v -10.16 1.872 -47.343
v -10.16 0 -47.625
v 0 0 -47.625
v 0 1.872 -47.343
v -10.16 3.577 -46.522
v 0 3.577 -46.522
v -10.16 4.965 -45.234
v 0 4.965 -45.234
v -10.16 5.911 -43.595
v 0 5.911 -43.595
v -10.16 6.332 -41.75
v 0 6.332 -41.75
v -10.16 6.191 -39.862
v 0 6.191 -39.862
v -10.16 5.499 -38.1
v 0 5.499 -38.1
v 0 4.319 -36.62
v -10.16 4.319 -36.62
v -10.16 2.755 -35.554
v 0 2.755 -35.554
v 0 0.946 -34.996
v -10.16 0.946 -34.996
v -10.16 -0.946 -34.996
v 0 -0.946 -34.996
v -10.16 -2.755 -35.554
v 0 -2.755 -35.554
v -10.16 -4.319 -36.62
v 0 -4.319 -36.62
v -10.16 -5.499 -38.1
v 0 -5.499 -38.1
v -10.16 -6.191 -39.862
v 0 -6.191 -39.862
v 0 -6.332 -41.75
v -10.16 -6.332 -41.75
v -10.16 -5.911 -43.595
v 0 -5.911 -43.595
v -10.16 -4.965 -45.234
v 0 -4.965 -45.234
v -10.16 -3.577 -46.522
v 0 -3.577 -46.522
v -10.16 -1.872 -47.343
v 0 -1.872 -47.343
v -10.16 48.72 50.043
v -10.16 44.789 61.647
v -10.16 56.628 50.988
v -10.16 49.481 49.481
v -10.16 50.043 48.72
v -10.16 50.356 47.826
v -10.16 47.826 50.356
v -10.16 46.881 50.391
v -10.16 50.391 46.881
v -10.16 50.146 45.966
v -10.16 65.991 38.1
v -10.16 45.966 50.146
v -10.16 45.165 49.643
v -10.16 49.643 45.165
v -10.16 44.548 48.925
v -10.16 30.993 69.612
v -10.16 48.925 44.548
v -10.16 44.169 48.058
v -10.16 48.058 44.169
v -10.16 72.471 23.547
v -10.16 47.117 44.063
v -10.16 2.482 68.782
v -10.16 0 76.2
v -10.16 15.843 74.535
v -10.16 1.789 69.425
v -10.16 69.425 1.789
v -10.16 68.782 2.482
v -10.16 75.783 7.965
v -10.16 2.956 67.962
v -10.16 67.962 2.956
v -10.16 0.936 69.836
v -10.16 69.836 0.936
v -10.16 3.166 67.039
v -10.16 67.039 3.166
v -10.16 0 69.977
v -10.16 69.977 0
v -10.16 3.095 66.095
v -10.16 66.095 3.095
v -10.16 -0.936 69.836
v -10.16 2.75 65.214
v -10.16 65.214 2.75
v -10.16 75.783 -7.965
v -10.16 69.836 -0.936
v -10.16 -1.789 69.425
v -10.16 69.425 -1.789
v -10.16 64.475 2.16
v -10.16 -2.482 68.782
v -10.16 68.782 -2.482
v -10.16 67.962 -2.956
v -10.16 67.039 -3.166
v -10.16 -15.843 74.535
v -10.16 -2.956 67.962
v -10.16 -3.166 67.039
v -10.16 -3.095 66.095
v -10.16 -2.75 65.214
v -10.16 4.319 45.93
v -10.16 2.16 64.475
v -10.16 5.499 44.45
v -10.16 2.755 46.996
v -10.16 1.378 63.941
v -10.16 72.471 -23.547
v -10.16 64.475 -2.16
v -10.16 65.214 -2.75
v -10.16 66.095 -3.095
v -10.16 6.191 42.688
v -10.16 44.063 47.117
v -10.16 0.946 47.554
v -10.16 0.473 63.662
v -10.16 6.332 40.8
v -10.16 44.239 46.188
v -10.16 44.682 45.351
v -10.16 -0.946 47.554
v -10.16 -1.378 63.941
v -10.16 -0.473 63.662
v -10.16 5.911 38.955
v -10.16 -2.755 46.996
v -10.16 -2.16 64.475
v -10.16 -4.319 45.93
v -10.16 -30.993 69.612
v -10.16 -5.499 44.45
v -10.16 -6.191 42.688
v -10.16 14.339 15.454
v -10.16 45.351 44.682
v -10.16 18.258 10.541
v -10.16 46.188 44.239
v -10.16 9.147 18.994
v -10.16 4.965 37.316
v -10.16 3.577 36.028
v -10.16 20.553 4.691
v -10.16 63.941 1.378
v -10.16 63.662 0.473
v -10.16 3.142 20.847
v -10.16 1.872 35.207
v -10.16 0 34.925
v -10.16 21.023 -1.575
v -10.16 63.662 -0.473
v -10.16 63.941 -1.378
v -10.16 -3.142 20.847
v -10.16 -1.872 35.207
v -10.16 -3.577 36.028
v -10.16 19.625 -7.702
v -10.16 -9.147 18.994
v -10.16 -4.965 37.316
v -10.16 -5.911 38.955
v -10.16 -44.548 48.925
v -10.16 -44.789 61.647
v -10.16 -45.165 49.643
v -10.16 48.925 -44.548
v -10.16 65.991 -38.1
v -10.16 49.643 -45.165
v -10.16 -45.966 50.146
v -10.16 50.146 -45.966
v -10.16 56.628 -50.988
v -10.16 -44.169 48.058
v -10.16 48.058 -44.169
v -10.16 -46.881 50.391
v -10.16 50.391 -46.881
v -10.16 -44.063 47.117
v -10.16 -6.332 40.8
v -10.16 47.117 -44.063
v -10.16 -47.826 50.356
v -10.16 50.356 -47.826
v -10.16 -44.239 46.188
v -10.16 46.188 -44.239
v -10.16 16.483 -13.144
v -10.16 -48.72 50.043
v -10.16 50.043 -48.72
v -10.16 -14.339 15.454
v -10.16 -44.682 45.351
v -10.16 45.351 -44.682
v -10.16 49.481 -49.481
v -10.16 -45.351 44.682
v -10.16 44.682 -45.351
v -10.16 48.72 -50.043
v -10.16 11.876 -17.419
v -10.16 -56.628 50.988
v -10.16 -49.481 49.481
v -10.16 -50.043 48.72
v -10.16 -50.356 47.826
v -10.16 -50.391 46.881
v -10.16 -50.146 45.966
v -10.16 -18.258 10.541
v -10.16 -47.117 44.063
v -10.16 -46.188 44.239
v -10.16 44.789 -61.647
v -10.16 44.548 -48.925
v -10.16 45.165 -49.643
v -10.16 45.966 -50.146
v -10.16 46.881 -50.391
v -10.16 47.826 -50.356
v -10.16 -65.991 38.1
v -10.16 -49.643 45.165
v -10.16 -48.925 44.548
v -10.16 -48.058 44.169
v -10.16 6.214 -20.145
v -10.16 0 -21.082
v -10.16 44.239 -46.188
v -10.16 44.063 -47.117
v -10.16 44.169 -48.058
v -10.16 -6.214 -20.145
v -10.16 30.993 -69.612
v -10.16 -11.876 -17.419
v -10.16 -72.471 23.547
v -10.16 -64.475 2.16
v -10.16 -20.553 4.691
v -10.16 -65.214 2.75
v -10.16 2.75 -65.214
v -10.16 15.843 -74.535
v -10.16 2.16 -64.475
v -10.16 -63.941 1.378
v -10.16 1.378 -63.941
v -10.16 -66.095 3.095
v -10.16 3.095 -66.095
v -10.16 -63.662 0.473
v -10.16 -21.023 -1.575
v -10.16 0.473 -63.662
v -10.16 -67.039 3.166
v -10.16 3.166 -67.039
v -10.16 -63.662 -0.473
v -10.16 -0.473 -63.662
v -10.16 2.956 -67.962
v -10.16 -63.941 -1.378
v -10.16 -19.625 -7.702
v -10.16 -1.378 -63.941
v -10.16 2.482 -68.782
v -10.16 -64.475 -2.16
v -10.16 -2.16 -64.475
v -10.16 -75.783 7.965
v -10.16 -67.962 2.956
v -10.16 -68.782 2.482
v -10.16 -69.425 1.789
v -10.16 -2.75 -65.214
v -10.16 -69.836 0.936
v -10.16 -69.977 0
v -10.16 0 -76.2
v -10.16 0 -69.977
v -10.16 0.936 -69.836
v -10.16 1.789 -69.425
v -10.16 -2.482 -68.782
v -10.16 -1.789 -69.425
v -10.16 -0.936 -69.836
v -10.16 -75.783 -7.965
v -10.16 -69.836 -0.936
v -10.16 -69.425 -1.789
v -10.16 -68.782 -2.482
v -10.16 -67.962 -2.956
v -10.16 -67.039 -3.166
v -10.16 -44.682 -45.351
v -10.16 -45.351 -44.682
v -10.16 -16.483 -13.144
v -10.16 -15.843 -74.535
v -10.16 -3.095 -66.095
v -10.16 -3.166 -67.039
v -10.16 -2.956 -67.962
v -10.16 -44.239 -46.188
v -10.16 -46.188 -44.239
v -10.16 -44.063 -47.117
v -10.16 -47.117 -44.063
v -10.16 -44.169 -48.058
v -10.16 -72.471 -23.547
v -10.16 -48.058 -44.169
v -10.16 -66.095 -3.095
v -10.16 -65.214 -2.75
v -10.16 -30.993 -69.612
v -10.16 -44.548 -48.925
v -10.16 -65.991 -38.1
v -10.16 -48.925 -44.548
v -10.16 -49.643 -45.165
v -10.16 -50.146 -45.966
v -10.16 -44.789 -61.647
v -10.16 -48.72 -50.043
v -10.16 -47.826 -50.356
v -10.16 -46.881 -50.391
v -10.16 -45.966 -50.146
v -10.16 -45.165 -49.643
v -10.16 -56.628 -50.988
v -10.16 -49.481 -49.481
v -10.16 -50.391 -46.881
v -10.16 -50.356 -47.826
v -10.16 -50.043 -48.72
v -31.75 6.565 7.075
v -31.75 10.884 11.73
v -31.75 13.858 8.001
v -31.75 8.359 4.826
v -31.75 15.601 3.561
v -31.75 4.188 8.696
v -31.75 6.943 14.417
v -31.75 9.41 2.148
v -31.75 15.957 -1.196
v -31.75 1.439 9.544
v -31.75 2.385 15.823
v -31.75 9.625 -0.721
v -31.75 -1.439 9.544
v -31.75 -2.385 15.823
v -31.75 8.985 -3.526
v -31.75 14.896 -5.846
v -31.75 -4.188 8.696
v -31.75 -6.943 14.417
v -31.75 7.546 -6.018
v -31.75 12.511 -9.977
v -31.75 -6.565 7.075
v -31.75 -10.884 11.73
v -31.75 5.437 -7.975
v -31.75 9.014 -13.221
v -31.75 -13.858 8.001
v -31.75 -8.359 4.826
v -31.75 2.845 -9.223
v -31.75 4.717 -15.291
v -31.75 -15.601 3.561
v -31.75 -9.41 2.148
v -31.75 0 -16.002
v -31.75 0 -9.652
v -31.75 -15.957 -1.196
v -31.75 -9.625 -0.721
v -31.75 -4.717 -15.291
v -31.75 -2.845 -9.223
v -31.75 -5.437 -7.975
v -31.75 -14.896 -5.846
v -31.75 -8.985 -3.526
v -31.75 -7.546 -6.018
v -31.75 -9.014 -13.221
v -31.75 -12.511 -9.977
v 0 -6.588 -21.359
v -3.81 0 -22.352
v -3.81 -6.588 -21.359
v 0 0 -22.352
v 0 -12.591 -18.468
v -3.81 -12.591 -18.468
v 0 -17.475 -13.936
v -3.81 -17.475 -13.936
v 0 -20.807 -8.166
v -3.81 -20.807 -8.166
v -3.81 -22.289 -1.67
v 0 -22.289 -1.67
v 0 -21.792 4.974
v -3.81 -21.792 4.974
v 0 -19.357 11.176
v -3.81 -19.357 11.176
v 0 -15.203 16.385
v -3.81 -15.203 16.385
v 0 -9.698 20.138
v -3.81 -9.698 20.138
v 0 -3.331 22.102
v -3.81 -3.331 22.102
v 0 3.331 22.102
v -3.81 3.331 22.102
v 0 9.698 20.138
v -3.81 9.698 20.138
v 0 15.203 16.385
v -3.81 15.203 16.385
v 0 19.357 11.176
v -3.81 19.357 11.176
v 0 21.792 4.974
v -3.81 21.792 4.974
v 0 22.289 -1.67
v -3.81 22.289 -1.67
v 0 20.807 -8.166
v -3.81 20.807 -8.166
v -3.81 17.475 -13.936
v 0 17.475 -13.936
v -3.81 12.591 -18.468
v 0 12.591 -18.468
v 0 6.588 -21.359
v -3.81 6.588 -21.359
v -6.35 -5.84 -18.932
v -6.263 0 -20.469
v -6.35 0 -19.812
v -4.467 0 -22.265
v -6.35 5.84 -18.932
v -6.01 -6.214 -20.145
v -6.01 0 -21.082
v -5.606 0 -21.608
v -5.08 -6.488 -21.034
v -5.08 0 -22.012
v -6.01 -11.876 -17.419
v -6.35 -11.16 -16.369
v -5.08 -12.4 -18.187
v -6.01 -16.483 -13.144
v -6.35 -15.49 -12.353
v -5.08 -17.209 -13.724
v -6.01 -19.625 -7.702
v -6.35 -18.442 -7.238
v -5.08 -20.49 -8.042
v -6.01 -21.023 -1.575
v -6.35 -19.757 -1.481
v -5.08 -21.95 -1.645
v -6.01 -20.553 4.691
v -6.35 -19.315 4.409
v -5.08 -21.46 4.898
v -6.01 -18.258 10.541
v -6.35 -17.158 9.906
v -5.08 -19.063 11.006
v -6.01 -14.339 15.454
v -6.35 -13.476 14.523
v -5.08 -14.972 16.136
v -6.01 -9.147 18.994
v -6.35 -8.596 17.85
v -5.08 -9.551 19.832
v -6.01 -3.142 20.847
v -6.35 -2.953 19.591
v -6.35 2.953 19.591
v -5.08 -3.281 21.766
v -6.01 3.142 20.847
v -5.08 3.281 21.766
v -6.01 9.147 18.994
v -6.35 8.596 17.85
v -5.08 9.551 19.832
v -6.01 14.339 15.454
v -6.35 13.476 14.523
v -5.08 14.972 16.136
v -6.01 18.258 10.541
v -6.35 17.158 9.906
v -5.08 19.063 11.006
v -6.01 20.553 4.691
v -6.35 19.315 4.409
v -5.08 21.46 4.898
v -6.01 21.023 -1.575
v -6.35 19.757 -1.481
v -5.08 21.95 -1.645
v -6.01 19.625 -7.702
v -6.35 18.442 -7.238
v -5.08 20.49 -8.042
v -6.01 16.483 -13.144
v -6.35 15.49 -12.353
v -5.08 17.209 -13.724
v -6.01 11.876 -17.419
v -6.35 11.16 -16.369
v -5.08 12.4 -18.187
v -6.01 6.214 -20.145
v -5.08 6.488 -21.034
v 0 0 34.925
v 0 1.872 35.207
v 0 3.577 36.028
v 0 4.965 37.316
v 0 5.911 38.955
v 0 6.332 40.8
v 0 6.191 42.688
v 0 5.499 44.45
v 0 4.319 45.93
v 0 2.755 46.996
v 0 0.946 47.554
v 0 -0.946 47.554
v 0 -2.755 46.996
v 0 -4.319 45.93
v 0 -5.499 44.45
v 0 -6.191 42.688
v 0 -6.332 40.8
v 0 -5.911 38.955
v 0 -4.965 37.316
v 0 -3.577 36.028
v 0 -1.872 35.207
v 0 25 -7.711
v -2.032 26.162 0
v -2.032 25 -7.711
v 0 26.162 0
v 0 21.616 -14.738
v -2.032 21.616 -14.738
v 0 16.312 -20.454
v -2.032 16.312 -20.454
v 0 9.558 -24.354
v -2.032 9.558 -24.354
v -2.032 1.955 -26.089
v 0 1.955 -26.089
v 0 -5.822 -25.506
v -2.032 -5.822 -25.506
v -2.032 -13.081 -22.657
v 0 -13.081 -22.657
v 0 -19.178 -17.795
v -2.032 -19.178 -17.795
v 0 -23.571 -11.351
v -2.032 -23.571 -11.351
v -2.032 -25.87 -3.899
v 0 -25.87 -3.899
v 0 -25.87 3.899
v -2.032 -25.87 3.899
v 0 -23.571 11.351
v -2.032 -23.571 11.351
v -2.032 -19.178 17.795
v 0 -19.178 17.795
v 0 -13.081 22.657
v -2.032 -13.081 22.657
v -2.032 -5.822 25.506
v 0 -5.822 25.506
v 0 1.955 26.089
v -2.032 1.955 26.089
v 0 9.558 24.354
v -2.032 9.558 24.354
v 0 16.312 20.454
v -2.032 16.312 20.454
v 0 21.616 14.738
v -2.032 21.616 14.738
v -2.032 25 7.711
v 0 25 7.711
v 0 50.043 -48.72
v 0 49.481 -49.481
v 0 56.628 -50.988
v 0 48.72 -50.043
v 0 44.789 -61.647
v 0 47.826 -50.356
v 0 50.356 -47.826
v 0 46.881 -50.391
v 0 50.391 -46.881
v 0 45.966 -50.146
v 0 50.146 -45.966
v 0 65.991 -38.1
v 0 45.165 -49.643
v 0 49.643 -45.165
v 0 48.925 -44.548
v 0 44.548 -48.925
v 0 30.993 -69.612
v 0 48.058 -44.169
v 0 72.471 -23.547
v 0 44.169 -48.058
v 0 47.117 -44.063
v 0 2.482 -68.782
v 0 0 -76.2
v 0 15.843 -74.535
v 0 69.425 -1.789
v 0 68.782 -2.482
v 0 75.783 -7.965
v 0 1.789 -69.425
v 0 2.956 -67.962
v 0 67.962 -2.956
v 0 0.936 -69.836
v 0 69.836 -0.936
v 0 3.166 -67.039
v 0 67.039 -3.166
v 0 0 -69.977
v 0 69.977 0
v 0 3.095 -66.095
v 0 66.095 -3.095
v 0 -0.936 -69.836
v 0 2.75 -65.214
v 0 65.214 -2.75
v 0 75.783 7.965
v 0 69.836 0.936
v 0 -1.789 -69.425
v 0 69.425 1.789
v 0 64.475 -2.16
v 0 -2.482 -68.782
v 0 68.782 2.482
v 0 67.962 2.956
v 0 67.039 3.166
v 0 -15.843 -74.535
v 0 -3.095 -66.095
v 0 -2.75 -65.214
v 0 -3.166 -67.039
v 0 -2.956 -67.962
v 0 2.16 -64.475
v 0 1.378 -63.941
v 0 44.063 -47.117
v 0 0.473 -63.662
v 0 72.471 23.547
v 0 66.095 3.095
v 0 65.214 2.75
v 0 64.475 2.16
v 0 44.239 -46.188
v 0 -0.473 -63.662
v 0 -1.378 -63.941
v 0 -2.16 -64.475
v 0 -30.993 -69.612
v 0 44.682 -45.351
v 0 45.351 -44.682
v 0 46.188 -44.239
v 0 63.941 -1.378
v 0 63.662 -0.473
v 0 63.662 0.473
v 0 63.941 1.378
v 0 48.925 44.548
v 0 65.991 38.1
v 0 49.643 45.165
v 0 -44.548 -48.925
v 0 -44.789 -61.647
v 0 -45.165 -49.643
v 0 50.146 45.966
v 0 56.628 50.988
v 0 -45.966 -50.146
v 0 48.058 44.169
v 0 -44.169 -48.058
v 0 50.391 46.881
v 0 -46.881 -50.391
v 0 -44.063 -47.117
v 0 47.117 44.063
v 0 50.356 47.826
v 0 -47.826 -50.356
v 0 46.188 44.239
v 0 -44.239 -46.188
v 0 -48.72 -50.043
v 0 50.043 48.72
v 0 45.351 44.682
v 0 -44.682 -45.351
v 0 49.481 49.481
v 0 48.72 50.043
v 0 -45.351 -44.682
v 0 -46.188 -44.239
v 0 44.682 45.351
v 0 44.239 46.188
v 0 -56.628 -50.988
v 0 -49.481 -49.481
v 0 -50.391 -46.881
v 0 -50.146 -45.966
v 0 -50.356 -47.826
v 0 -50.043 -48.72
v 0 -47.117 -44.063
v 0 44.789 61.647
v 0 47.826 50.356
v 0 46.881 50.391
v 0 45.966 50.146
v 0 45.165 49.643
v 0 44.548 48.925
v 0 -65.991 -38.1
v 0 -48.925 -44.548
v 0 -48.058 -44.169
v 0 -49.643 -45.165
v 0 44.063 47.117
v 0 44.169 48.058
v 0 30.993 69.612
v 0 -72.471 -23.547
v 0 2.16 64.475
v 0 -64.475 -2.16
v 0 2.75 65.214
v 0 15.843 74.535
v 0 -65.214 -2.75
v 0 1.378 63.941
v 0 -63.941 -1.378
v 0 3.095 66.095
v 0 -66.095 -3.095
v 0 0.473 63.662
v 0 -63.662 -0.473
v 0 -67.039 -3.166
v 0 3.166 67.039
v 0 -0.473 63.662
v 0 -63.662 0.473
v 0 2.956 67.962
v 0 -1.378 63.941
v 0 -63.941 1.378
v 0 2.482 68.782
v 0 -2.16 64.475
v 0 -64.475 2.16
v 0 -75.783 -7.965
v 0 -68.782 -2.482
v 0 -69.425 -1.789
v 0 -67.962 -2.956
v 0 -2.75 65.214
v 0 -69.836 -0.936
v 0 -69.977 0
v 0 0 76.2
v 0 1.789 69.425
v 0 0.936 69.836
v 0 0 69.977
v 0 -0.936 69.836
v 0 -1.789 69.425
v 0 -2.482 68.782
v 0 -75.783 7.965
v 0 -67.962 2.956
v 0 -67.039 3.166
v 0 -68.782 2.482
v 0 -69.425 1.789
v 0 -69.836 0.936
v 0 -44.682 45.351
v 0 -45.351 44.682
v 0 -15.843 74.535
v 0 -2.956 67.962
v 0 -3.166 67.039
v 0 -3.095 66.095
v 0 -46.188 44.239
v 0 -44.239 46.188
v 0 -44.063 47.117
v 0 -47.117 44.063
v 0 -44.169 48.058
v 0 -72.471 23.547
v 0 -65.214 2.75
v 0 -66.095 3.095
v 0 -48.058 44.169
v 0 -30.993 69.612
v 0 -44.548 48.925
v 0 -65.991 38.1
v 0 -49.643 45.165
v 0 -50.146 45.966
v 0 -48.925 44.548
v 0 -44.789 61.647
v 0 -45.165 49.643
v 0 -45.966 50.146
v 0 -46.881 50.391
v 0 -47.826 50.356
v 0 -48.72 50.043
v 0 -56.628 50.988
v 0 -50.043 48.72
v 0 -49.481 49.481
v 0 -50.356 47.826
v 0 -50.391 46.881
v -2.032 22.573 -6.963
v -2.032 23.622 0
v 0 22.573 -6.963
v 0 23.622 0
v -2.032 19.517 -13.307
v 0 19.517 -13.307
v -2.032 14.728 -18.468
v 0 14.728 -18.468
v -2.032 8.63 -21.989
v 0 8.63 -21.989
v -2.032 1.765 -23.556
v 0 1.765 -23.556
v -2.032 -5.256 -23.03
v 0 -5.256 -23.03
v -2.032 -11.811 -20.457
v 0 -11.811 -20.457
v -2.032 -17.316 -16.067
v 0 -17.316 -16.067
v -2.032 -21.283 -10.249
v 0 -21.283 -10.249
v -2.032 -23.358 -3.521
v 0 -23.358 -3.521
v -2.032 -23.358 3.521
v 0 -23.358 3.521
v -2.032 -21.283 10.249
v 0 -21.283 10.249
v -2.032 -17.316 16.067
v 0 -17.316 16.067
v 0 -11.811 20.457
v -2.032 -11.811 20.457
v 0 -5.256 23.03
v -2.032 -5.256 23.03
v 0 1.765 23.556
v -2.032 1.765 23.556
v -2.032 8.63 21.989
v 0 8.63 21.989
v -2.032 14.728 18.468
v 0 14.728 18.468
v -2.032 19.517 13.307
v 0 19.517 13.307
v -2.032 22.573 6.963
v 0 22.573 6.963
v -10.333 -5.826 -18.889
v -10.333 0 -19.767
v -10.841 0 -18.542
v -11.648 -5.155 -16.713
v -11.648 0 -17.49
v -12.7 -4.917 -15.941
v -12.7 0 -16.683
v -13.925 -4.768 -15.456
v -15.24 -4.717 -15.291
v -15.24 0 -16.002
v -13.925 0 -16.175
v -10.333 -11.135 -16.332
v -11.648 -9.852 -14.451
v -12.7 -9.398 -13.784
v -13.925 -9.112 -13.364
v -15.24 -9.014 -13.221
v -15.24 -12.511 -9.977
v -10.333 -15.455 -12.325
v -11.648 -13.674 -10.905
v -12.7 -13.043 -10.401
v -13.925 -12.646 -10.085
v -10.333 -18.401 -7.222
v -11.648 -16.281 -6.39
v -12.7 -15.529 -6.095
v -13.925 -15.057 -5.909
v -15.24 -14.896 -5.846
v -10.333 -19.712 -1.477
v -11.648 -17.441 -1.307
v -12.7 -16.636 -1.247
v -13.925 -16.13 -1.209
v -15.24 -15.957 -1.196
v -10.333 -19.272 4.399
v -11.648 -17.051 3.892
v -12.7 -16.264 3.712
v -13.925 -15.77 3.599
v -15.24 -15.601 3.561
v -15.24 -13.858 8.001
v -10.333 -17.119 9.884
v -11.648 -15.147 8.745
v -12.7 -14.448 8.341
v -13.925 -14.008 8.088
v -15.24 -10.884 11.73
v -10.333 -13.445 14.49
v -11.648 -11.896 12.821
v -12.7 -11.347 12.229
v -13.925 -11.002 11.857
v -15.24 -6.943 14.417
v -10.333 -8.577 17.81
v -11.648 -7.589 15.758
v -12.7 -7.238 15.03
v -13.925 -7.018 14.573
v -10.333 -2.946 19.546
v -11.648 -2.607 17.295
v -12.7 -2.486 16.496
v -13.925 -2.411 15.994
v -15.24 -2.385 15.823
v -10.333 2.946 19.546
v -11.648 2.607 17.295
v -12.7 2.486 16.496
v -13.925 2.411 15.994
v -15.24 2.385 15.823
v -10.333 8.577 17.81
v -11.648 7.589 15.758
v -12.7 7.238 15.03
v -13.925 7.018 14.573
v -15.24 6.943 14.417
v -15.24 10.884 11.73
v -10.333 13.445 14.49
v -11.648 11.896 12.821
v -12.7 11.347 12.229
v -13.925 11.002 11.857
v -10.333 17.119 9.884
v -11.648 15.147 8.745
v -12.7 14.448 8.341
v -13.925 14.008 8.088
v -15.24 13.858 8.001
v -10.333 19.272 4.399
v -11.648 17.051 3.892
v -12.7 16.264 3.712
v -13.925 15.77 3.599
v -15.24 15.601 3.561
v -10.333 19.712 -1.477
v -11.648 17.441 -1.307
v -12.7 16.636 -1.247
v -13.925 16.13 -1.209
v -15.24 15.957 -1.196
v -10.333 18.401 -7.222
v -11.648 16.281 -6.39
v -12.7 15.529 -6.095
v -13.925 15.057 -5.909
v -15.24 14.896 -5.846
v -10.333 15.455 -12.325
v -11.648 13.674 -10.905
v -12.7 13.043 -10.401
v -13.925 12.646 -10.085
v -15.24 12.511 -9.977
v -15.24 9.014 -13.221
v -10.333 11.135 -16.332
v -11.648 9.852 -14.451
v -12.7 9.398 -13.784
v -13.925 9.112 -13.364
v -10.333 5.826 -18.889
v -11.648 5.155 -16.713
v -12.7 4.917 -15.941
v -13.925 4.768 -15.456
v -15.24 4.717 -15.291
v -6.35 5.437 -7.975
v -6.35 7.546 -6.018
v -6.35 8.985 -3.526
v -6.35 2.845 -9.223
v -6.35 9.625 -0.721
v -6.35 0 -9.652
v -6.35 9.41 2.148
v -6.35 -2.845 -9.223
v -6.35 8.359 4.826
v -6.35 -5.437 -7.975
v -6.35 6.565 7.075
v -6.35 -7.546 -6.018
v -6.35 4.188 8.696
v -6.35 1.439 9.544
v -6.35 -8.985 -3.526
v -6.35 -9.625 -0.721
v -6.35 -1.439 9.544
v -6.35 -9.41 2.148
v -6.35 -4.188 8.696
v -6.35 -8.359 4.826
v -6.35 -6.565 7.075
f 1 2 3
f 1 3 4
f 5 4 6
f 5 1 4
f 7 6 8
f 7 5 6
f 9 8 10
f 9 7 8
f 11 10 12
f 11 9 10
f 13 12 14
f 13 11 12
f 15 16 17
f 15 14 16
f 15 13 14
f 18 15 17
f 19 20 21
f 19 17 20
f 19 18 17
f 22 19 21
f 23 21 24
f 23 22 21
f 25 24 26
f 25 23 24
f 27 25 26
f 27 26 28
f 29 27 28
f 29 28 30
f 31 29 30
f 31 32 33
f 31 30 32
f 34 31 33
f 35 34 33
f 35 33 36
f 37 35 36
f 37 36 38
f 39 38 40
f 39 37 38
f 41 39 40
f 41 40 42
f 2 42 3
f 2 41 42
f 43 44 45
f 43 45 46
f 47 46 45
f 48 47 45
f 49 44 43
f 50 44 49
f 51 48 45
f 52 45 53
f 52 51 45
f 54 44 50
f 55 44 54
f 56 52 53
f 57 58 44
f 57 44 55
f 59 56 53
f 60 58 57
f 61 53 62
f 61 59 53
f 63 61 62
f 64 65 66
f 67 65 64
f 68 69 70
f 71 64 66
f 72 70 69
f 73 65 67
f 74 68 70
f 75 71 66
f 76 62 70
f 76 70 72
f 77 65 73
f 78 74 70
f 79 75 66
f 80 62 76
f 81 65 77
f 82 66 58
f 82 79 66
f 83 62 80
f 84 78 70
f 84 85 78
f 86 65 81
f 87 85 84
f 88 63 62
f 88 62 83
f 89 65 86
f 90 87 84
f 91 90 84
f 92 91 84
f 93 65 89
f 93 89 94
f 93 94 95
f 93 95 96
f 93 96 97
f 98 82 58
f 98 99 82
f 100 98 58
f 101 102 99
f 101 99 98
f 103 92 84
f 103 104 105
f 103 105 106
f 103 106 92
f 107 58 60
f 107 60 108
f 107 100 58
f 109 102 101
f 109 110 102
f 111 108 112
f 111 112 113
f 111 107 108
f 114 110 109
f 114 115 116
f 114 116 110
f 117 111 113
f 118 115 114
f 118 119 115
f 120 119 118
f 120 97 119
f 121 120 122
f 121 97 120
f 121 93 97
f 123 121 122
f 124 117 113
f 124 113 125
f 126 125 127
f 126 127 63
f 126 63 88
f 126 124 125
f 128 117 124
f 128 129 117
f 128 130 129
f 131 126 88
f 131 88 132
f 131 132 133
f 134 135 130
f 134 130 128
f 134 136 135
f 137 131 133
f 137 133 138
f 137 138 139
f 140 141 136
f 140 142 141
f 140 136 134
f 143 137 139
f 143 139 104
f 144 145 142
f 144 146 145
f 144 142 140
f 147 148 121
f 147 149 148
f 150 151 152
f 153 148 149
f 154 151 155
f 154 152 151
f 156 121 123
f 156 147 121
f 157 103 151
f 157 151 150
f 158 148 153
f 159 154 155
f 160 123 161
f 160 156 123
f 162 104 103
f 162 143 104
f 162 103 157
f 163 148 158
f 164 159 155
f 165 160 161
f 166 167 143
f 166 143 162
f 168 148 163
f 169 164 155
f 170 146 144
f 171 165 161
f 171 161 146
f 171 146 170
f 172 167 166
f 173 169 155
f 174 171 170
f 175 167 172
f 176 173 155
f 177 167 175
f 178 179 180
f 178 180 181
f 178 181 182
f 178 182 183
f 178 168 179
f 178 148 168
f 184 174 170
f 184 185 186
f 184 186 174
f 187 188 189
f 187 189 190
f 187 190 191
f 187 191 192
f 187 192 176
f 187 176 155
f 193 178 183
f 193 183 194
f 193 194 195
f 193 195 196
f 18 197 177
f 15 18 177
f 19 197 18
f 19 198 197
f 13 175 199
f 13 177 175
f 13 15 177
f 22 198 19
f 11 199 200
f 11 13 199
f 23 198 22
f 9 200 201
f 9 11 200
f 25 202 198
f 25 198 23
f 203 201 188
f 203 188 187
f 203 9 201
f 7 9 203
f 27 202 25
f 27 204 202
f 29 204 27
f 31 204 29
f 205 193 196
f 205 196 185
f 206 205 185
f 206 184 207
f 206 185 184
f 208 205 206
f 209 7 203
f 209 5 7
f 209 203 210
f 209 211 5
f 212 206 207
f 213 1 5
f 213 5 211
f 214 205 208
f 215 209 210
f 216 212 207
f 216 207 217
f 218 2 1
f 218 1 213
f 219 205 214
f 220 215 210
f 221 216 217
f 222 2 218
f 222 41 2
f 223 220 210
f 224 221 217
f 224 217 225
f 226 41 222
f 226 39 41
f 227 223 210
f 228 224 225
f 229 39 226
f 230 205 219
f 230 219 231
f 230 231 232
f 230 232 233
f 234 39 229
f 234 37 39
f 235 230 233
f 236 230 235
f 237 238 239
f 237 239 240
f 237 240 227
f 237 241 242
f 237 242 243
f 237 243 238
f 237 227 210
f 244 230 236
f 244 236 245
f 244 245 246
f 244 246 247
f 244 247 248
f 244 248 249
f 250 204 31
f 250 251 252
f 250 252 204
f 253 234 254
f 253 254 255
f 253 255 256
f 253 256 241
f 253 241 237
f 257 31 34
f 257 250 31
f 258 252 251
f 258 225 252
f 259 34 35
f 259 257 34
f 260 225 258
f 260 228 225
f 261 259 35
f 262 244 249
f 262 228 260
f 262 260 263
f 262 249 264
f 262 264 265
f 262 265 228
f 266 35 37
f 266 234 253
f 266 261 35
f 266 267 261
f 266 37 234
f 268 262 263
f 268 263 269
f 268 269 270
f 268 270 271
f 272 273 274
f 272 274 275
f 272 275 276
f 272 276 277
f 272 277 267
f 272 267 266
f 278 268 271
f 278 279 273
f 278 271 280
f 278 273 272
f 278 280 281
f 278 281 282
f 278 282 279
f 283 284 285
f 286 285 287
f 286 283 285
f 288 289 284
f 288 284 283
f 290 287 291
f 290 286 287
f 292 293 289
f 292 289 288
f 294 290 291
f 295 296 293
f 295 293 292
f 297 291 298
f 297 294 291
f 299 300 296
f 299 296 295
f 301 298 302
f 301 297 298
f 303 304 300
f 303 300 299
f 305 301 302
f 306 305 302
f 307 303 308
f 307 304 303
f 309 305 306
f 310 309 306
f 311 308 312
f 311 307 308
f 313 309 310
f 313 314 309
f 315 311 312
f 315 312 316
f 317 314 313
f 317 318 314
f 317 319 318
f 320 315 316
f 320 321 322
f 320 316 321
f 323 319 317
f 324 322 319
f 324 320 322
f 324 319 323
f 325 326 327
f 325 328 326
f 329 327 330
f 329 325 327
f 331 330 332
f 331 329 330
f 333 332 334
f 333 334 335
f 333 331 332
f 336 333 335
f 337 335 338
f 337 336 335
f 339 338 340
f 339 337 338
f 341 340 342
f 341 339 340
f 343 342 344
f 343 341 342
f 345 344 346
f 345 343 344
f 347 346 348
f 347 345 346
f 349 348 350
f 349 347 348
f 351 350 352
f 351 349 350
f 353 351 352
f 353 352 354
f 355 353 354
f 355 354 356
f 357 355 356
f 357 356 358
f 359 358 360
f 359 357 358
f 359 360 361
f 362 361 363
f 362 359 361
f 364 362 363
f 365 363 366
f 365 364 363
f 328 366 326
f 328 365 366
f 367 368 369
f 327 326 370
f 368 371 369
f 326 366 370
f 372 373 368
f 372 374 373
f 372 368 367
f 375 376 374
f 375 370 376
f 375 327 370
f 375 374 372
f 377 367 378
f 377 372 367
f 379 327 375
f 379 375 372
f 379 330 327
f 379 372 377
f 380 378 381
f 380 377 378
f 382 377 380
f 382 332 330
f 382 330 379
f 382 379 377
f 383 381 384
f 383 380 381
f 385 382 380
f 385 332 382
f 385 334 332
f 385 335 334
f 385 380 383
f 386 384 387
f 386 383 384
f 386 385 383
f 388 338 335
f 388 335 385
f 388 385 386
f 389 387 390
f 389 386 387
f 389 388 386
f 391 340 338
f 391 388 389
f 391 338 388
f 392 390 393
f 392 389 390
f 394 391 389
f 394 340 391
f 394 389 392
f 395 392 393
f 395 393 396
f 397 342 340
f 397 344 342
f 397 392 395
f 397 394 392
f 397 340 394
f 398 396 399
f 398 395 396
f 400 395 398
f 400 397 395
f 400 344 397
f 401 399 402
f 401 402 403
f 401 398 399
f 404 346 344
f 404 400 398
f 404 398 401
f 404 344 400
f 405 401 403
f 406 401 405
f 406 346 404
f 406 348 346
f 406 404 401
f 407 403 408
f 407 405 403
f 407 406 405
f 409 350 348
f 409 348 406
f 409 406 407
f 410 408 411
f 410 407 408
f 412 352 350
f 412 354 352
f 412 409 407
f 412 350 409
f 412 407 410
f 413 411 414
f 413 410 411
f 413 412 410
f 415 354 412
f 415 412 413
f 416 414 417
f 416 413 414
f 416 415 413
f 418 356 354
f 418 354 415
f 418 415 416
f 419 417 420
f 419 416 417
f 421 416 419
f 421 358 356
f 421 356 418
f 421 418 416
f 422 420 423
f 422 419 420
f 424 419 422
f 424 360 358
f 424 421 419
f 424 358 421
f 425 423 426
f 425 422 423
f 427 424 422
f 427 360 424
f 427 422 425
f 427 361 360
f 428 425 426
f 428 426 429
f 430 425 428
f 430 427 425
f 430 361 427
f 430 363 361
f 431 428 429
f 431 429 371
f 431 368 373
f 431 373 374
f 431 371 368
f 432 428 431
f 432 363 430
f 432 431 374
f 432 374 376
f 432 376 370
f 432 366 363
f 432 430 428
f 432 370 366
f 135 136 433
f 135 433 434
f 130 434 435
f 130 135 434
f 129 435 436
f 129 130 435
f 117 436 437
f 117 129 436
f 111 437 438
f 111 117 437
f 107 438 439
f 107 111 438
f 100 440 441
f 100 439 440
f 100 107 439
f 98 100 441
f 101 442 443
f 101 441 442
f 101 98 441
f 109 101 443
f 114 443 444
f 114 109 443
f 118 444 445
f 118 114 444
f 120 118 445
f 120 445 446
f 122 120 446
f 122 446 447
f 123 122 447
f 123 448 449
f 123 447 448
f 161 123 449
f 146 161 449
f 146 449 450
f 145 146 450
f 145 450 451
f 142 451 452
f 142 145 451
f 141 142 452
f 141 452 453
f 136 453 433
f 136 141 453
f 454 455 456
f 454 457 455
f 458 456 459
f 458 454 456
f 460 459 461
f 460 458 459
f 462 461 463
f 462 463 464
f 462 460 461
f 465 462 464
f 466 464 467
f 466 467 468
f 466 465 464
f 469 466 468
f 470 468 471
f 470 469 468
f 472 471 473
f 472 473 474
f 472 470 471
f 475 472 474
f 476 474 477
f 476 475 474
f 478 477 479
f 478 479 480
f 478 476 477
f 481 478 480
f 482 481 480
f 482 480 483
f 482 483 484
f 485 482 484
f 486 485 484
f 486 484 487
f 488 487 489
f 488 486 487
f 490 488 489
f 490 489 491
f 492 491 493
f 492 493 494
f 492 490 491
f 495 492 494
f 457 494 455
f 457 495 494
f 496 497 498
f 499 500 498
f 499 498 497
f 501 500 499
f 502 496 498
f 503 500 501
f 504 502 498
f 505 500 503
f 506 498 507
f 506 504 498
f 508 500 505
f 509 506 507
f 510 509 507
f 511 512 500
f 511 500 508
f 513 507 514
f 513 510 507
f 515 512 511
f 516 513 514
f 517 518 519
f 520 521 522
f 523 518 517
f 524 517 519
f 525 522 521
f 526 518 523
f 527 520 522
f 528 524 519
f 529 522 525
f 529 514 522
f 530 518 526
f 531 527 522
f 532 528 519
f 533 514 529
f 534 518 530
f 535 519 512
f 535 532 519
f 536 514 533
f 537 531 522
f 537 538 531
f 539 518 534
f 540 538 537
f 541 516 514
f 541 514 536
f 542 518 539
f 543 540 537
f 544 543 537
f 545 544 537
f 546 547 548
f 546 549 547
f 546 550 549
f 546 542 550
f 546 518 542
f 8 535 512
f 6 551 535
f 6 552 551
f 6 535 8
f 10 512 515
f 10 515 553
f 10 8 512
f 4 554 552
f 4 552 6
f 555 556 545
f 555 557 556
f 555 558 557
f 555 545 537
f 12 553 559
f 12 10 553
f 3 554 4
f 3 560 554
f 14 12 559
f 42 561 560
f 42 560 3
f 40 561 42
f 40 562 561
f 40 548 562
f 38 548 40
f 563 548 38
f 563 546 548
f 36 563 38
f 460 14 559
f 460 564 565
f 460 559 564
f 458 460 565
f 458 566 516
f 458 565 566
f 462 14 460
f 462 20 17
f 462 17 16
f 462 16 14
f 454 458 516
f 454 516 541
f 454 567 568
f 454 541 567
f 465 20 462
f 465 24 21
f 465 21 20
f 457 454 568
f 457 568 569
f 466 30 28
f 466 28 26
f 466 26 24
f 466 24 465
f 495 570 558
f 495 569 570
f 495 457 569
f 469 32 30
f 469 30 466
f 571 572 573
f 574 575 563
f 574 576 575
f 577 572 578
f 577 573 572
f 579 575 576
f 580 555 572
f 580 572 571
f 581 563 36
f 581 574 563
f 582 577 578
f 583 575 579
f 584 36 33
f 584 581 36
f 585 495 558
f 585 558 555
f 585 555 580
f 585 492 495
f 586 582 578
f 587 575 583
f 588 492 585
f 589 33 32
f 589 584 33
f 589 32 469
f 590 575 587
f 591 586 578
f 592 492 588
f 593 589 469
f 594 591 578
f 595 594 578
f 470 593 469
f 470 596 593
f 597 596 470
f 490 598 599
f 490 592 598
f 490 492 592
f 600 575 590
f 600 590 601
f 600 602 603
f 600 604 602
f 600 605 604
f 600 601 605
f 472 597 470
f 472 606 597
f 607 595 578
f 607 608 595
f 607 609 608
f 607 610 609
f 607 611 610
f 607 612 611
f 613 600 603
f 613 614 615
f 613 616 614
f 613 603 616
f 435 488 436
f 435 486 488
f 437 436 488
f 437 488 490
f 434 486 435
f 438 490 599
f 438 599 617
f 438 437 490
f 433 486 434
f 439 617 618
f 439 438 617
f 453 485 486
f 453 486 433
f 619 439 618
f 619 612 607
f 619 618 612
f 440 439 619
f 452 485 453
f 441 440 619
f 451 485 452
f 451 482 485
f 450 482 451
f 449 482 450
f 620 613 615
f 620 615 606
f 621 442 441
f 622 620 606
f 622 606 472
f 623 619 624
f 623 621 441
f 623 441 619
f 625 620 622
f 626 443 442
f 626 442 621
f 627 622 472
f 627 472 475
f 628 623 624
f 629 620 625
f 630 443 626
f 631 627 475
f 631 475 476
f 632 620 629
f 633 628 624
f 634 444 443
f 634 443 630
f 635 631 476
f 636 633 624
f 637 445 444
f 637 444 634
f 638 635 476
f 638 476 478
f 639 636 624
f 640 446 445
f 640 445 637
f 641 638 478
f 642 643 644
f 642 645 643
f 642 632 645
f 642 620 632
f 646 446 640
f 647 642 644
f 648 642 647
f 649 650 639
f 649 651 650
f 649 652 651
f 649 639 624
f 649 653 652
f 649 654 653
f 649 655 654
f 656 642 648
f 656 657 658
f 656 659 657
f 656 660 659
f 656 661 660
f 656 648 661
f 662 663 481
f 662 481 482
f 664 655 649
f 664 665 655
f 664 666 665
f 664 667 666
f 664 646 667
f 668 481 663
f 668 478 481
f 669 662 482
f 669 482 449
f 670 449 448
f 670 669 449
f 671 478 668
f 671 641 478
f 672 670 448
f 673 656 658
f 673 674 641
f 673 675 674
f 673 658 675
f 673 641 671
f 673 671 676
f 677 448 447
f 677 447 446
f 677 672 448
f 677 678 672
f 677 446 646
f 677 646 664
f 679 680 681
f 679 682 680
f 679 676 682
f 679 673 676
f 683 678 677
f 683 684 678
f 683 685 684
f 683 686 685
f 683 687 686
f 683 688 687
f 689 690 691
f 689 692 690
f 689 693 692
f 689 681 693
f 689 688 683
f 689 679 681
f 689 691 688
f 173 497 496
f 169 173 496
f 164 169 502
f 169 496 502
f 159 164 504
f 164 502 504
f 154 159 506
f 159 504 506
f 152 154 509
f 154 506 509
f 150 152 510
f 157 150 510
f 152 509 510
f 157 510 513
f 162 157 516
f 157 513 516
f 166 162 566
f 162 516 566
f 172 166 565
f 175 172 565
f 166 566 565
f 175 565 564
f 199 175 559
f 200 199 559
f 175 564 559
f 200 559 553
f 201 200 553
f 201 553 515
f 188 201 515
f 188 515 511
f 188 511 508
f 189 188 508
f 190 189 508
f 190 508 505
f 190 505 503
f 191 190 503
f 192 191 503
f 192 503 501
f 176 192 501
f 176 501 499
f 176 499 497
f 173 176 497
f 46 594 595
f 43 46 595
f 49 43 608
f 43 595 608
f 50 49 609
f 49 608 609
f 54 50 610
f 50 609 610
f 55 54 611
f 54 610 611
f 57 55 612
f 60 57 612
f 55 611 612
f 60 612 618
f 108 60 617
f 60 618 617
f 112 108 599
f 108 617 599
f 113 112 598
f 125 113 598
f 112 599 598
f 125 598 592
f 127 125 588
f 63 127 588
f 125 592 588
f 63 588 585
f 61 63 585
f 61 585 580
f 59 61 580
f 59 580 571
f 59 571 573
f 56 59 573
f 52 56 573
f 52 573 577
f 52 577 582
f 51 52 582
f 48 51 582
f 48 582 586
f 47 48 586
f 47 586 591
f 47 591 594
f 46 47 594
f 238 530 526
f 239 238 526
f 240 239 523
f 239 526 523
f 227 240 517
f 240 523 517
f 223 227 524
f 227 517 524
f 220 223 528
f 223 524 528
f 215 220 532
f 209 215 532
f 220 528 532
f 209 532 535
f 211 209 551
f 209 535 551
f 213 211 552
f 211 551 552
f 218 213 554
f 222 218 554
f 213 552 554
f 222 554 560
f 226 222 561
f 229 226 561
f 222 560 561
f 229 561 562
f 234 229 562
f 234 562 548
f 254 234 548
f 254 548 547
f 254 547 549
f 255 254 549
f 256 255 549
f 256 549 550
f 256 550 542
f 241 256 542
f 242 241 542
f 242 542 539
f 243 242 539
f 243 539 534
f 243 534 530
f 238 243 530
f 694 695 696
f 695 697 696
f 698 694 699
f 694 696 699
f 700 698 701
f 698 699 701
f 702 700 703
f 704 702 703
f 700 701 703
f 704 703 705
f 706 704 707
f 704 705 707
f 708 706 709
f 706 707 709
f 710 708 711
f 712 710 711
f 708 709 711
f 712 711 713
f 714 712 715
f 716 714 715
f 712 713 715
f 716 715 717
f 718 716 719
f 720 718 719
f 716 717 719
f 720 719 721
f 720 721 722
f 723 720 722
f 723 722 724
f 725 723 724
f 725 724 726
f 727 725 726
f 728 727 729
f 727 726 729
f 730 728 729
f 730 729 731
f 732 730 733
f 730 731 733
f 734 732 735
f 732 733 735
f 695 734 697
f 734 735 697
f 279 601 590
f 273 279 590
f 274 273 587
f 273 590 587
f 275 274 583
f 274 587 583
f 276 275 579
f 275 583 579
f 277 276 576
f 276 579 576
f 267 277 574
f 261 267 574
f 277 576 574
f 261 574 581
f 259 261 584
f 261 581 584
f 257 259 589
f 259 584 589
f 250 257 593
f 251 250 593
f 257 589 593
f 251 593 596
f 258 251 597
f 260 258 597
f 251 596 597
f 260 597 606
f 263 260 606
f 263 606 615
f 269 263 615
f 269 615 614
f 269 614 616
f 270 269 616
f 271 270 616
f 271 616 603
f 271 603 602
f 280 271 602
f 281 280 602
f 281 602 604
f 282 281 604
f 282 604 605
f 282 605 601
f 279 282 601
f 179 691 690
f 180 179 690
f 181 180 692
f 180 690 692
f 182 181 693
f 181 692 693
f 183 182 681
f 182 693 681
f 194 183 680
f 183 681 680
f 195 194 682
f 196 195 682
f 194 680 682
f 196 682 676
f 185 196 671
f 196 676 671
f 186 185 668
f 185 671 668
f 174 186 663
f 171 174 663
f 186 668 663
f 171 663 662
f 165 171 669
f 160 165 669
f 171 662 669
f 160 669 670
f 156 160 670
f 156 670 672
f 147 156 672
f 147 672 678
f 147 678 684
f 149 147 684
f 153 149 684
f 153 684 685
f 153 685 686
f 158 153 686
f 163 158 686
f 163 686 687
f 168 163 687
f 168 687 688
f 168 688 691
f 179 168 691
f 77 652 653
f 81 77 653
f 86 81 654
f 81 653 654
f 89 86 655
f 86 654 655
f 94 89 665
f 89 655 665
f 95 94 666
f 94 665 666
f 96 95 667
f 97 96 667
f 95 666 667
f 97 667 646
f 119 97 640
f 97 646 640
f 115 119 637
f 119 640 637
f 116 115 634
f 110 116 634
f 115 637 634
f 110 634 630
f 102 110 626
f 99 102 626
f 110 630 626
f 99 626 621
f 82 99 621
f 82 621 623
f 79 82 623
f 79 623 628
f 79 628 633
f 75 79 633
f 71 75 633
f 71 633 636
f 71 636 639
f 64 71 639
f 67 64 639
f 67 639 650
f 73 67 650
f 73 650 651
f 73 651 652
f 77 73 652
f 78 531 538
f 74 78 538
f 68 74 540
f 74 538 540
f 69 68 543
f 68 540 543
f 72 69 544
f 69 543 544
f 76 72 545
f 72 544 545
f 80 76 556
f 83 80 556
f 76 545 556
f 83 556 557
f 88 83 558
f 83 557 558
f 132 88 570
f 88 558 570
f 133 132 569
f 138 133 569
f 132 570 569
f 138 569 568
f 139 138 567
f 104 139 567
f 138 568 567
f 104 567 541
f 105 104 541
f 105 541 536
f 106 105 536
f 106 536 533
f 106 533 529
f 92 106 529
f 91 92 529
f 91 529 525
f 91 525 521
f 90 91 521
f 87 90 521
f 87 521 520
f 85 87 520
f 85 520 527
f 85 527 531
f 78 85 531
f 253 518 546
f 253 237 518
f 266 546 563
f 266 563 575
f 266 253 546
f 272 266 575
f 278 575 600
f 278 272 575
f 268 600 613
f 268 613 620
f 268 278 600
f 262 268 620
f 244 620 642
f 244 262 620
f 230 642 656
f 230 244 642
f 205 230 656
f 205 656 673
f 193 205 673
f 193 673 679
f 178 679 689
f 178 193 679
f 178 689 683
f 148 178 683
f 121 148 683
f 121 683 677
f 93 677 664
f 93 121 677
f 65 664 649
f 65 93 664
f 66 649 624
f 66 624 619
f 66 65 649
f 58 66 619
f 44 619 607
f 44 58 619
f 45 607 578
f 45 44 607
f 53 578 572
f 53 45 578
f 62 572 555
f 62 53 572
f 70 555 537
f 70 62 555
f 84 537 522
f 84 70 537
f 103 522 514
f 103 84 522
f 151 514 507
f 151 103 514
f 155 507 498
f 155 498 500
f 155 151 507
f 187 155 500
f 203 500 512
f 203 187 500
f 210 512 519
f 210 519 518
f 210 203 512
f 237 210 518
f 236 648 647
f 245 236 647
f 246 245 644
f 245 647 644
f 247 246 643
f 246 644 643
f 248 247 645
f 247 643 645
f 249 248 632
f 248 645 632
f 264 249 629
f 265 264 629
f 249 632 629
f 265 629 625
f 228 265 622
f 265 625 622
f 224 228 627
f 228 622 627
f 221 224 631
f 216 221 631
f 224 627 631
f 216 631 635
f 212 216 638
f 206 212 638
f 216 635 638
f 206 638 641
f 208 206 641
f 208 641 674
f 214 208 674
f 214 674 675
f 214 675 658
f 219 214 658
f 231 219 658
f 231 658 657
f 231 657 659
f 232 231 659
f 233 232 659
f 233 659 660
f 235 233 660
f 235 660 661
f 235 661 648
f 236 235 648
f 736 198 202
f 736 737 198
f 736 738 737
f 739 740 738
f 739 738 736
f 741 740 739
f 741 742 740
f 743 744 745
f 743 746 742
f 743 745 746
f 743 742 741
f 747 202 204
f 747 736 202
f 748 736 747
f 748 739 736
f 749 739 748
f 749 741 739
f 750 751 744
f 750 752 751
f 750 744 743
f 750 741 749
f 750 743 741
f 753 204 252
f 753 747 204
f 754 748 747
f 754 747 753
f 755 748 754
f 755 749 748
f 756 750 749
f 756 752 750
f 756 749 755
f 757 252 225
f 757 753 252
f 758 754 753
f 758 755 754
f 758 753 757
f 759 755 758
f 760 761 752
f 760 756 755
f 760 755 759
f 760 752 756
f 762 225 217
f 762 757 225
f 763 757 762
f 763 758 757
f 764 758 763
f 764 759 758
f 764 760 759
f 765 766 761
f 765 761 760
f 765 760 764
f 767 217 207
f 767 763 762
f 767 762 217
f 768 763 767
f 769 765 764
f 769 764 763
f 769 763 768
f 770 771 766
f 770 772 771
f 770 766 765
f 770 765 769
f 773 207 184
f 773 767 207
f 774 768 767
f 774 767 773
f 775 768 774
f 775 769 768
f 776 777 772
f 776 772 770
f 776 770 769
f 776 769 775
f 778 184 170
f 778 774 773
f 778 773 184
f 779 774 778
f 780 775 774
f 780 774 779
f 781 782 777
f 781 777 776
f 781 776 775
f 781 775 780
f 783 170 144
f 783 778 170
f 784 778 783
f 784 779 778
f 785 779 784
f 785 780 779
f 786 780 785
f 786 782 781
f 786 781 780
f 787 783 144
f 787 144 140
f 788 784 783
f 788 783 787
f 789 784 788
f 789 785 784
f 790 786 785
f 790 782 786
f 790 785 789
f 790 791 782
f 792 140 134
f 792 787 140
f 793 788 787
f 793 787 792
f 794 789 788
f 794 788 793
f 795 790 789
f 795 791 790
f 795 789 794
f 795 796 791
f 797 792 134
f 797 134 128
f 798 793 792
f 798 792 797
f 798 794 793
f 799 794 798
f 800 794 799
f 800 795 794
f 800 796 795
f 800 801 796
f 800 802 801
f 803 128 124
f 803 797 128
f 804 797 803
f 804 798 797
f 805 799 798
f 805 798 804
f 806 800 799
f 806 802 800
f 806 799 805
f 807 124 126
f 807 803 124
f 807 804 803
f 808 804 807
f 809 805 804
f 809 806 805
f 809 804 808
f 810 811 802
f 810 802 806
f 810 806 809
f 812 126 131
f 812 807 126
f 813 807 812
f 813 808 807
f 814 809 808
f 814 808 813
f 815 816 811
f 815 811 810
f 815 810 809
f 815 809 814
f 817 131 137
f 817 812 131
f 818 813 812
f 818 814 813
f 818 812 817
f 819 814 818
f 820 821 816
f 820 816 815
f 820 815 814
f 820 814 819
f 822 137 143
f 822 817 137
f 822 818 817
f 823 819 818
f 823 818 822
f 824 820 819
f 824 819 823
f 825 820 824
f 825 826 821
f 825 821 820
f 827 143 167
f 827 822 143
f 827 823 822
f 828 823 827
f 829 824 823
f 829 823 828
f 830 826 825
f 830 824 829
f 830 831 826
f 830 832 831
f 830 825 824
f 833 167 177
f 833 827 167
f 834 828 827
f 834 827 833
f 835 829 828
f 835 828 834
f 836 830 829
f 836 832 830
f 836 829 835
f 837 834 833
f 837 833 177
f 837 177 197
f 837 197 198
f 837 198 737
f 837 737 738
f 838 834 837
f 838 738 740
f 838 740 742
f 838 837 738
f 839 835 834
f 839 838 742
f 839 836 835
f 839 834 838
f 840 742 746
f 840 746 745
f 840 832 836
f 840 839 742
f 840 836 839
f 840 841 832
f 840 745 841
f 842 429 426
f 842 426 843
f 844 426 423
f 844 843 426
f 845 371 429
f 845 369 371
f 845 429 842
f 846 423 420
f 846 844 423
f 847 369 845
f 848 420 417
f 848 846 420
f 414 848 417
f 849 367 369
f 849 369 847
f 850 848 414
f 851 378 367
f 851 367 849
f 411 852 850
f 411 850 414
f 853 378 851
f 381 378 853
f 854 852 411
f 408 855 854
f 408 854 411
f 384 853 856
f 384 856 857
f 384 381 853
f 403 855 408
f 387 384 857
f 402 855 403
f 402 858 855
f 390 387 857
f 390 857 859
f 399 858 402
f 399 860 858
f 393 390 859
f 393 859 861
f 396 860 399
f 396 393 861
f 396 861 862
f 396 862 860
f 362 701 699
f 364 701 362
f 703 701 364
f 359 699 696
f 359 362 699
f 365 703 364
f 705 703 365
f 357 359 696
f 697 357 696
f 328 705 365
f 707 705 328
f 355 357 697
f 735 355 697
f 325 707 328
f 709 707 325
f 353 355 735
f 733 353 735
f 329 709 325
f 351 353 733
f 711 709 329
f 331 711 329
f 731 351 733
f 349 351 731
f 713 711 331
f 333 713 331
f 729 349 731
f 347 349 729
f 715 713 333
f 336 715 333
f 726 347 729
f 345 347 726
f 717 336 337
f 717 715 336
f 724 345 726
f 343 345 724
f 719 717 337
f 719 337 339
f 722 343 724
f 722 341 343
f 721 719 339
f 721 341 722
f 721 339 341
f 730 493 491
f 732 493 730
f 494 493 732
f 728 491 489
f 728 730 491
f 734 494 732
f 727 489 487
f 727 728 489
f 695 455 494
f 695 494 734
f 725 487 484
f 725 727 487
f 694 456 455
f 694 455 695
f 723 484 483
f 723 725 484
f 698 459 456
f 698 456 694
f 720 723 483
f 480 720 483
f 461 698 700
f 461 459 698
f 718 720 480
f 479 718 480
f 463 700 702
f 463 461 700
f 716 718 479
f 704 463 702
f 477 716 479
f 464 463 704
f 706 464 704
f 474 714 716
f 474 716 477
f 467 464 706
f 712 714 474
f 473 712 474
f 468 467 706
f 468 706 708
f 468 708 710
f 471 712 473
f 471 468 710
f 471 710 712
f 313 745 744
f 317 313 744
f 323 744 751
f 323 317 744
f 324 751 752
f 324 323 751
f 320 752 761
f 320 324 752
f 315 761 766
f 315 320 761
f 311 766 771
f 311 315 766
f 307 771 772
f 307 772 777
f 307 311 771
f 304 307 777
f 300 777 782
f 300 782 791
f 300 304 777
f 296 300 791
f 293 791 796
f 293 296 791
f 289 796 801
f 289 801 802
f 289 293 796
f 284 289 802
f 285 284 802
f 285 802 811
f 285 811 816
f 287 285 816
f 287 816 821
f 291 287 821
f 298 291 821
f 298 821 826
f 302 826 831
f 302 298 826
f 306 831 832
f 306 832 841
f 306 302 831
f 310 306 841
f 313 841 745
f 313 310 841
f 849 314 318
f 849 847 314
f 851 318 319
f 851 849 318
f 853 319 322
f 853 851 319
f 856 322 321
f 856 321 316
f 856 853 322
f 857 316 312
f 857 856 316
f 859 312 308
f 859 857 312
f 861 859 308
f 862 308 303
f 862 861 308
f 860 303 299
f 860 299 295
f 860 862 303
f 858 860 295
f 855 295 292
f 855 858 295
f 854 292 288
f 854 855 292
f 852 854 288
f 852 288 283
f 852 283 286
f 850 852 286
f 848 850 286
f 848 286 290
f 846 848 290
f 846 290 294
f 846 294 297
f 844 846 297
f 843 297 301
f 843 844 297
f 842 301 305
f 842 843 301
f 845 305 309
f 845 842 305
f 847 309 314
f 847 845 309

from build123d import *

# Parameters (mm, degrees)
CUT_EXTRUDE1_DEPTH      = 113.342968182
CUT_EXTRUDE1_DEPTH_BACK = 113.342968182
SKETCH2_R               = 6.35
SKETCH3_R               = 3.175
CUT_EXTRUDE2_DEPTH      = 113.342968182
CIRPATTERN1_COUNT       = 8
SKETCH4_W               = 2.032
SKETCH4_H               = 2.54


with BuildPart() as part:
    # Sketch1 → Revolve1 (revolve)
    with BuildSketch(Plane.XY, mode=Mode.PRIVATE) as revolve1_sk:
        with BuildLine():
            Line((0, 76.2), (-10.16, 76.2))
            Line((-10.16, 76.2), (-10.16, 21.082))
            ThreePointArc((-10.16, 21.082), (-11.647897552, 17.489897552), (-15.24, 16.002))
            Line((-15.24, 16.002), (-31.75, 16.002))
            Line((-31.75, 16.002), (-31.75, 9.652))
            Line((-31.75, 9.652), (-6.35, 9.652))
            Line((-6.35, 9.652), (-6.35, 19.812))
            ThreePointArc((-6.35, 19.812), (-5.606051224, 21.608051224), (-3.81, 22.352))
            Line((-3.81, 22.352), (0, 22.352))
            Line((0, 22.352), (0, 76.2))
        make_face()
    revolve(revolve1_sk.sketch.rotate(Axis((0, 0, 0), (-1, 0, 0)), 90), axis=Axis((0, 0, 0), (-1, 0, 0)))

    # Sketch2 → Cut-Extrude1 (cut, two sides: drawn at the far end of the back side and taken through both)
    with BuildSketch(Plane(origin=(0, 0, 0), x_dir=(0, 0, -1), z_dir=(1, 0, 0)).offset(-CUT_EXTRUDE1_DEPTH_BACK)):
        with Locations((41.275, 0)):
            Circle(SKETCH2_R)
        with Locations((-41.275, 0)):
            Circle(SKETCH2_R)
    extrude(amount=CUT_EXTRUDE1_DEPTH + CUT_EXTRUDE1_DEPTH_BACK, mode=Mode.SUBTRACT)

    # Sketch3 → Cut-Extrude2 (cut, through all)
    with BuildSketch(Plane(origin=(0, 0, 0), x_dir=(0, 0, -1), z_dir=(1, 0, 0))):
        with Locations((66.802, 0)):
            Circle(SKETCH3_R)
    cut_extrude2 = extrude(amount=-CUT_EXTRUDE2_DEPTH, mode=Mode.SUBTRACT)

    # CirPattern1: Cut-Extrude2 ×8 about axis
    cirpattern1_axis = Axis((0, 0, 0), (1, 0, 0))
    for i in range(1, CIRPATTERN1_COUNT):
        add(cut_extrude2.rotate(cirpattern1_axis, i * 360 / CIRPATTERN1_COUNT), mode=Mode.SUBTRACT)

    # Sketch4 → Cut-Revolve1 (revolve, cut)
    with BuildSketch(Plane.XY):
        with Locations((-1.016, 24.892)):
            Rectangle(SKETCH4_W, SKETCH4_H)
    revolve(axis=Axis((0, 0, 0), (-1, 0, 0)), mode=Mode.SUBTRACT)


solid = part.part
